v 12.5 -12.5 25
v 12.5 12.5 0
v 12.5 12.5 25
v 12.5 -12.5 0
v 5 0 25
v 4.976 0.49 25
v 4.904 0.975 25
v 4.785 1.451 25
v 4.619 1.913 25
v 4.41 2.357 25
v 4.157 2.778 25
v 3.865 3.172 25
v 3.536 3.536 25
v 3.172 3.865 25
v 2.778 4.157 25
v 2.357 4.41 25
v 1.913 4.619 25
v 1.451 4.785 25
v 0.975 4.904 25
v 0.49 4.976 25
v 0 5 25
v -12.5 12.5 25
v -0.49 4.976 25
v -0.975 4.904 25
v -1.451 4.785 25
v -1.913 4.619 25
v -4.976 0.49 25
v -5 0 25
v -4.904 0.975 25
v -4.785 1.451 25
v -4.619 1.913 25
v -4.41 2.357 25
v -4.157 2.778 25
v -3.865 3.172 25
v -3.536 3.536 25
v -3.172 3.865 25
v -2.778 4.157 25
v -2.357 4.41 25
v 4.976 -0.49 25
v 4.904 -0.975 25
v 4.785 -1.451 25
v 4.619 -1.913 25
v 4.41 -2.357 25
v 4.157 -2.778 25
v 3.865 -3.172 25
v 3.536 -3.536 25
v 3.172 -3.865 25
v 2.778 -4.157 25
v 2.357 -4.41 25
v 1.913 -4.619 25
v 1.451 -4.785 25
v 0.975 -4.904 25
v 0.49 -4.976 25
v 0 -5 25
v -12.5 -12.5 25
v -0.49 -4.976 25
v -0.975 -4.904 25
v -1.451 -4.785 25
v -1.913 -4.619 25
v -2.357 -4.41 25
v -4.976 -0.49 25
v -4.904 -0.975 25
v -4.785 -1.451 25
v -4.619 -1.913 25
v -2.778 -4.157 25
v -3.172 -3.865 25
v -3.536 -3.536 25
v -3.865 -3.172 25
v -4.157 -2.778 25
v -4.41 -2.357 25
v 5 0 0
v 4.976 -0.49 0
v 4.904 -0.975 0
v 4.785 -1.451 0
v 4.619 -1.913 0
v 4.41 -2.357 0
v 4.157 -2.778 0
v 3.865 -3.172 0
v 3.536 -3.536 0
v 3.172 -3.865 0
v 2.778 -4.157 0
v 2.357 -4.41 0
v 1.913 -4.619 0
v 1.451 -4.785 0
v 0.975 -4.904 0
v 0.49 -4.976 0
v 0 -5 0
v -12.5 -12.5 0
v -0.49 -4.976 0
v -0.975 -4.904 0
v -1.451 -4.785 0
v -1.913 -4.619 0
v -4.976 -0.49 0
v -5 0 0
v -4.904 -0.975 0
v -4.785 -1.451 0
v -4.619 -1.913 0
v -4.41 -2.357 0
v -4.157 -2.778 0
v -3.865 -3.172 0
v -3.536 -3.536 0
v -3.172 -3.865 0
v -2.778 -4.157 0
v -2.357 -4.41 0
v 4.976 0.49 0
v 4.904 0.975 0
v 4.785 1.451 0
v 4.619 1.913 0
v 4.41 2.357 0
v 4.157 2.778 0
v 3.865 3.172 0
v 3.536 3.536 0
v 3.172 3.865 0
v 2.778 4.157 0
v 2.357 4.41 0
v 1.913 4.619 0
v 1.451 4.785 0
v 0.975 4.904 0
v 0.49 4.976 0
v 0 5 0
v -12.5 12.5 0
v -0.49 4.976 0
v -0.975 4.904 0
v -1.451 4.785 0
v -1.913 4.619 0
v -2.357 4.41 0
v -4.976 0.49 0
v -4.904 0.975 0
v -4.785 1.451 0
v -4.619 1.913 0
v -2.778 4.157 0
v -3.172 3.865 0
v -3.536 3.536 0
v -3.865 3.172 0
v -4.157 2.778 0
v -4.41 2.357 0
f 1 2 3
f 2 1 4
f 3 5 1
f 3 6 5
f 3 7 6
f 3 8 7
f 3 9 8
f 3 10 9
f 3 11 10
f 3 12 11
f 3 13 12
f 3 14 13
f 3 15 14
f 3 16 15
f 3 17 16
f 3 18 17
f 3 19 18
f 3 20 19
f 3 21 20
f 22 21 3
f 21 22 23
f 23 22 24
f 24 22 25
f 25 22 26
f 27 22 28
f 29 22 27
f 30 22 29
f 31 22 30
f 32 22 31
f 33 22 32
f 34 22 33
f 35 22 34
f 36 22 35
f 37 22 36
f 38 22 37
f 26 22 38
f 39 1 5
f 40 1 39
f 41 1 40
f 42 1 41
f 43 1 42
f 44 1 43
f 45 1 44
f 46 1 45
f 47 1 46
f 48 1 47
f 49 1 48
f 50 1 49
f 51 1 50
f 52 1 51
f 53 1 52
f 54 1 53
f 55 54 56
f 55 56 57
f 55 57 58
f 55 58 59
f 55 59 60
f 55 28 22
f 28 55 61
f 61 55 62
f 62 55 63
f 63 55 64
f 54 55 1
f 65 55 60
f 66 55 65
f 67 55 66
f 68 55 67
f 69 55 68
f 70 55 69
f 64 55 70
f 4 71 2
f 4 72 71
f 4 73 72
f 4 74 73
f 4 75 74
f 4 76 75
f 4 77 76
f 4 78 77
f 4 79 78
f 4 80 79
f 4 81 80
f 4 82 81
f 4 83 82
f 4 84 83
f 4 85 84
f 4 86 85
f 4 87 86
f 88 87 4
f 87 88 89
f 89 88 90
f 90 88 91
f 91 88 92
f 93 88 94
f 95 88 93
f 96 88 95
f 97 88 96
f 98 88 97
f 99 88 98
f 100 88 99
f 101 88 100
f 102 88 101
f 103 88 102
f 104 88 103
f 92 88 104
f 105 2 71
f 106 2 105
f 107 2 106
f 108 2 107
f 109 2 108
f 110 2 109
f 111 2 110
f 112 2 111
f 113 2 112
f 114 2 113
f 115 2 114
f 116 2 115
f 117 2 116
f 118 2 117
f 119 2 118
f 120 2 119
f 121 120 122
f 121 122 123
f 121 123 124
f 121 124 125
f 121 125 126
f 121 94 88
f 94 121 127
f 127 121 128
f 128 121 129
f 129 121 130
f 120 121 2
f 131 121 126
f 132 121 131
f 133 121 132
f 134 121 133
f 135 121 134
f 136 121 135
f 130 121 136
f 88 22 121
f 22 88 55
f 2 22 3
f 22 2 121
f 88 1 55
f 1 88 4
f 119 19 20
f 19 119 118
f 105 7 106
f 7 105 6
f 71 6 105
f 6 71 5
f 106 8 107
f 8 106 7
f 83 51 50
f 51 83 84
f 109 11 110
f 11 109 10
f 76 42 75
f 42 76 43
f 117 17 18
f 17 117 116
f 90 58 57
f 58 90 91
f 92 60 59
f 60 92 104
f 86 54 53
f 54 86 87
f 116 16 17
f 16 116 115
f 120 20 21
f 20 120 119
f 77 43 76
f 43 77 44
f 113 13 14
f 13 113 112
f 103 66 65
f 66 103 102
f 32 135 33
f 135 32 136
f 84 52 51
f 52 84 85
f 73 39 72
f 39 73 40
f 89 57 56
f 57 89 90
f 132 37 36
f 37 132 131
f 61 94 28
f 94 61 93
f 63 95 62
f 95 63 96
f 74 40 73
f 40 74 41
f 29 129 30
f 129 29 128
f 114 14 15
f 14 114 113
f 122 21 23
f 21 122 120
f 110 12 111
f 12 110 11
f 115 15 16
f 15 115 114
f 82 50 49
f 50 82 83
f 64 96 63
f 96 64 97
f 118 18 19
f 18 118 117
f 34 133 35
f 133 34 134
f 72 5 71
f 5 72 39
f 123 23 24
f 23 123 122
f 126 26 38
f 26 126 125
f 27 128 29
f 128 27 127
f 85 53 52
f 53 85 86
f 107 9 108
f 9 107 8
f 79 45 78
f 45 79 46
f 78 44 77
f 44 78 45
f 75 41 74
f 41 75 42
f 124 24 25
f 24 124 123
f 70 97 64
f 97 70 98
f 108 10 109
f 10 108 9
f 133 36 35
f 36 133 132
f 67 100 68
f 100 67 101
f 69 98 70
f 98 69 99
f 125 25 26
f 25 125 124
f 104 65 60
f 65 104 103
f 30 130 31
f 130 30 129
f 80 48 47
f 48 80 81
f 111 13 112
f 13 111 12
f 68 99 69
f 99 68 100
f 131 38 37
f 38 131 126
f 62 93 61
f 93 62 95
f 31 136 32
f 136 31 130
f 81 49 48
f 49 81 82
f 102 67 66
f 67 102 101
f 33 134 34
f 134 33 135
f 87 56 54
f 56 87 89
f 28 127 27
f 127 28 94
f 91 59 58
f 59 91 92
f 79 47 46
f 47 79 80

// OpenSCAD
/* [Dimensions] */
// Edge length of the cube
cube_size = 25; // [10:100]
// Diameter of the vertical through-hole
hole_diameter = 10; // [2:0.5:20]
// Chamfer size on the top edges
chamfer = 2; // [0:0.5:5]

/* [Quality] */
// Global curve resolution
$fn = 64;

// Derived values
hole_radius = hole_diameter / 2;
// Side length of the 45-degree edge cutter (gives a chamfer leg of `chamfer`)
cutter_side = chamfer * sqrt(2);
cutter_len = cube_size + 2; // extend past the faces

difference() {
    // Cube sitting on the build plate, centered in X/Y
    translate([0, 0, cube_size / 2])
        cube(cube_size, center = true);

    // Vertical through-hole, extended past both faces
    translate([0, 0, -0.5])
        cylinder(h = cube_size + 1, r = hole_radius);

    // 45-degree chamfer cutters along the four top edges
    if (chamfer > 0)
        for (a = [0, 90, 180, 270])
            rotate([0, 0, a])
                translate([cube_size / 2, 0, cube_size])
                    rotate([0, 0, 0])
                        rotate([45, 0, 0])
                            rotate([0, 0, 0])
                                cube([0.01, 0, 0]); // placeholder (replaced below)
}

// NOTE: placeholder above is invalid — see corrected version below
